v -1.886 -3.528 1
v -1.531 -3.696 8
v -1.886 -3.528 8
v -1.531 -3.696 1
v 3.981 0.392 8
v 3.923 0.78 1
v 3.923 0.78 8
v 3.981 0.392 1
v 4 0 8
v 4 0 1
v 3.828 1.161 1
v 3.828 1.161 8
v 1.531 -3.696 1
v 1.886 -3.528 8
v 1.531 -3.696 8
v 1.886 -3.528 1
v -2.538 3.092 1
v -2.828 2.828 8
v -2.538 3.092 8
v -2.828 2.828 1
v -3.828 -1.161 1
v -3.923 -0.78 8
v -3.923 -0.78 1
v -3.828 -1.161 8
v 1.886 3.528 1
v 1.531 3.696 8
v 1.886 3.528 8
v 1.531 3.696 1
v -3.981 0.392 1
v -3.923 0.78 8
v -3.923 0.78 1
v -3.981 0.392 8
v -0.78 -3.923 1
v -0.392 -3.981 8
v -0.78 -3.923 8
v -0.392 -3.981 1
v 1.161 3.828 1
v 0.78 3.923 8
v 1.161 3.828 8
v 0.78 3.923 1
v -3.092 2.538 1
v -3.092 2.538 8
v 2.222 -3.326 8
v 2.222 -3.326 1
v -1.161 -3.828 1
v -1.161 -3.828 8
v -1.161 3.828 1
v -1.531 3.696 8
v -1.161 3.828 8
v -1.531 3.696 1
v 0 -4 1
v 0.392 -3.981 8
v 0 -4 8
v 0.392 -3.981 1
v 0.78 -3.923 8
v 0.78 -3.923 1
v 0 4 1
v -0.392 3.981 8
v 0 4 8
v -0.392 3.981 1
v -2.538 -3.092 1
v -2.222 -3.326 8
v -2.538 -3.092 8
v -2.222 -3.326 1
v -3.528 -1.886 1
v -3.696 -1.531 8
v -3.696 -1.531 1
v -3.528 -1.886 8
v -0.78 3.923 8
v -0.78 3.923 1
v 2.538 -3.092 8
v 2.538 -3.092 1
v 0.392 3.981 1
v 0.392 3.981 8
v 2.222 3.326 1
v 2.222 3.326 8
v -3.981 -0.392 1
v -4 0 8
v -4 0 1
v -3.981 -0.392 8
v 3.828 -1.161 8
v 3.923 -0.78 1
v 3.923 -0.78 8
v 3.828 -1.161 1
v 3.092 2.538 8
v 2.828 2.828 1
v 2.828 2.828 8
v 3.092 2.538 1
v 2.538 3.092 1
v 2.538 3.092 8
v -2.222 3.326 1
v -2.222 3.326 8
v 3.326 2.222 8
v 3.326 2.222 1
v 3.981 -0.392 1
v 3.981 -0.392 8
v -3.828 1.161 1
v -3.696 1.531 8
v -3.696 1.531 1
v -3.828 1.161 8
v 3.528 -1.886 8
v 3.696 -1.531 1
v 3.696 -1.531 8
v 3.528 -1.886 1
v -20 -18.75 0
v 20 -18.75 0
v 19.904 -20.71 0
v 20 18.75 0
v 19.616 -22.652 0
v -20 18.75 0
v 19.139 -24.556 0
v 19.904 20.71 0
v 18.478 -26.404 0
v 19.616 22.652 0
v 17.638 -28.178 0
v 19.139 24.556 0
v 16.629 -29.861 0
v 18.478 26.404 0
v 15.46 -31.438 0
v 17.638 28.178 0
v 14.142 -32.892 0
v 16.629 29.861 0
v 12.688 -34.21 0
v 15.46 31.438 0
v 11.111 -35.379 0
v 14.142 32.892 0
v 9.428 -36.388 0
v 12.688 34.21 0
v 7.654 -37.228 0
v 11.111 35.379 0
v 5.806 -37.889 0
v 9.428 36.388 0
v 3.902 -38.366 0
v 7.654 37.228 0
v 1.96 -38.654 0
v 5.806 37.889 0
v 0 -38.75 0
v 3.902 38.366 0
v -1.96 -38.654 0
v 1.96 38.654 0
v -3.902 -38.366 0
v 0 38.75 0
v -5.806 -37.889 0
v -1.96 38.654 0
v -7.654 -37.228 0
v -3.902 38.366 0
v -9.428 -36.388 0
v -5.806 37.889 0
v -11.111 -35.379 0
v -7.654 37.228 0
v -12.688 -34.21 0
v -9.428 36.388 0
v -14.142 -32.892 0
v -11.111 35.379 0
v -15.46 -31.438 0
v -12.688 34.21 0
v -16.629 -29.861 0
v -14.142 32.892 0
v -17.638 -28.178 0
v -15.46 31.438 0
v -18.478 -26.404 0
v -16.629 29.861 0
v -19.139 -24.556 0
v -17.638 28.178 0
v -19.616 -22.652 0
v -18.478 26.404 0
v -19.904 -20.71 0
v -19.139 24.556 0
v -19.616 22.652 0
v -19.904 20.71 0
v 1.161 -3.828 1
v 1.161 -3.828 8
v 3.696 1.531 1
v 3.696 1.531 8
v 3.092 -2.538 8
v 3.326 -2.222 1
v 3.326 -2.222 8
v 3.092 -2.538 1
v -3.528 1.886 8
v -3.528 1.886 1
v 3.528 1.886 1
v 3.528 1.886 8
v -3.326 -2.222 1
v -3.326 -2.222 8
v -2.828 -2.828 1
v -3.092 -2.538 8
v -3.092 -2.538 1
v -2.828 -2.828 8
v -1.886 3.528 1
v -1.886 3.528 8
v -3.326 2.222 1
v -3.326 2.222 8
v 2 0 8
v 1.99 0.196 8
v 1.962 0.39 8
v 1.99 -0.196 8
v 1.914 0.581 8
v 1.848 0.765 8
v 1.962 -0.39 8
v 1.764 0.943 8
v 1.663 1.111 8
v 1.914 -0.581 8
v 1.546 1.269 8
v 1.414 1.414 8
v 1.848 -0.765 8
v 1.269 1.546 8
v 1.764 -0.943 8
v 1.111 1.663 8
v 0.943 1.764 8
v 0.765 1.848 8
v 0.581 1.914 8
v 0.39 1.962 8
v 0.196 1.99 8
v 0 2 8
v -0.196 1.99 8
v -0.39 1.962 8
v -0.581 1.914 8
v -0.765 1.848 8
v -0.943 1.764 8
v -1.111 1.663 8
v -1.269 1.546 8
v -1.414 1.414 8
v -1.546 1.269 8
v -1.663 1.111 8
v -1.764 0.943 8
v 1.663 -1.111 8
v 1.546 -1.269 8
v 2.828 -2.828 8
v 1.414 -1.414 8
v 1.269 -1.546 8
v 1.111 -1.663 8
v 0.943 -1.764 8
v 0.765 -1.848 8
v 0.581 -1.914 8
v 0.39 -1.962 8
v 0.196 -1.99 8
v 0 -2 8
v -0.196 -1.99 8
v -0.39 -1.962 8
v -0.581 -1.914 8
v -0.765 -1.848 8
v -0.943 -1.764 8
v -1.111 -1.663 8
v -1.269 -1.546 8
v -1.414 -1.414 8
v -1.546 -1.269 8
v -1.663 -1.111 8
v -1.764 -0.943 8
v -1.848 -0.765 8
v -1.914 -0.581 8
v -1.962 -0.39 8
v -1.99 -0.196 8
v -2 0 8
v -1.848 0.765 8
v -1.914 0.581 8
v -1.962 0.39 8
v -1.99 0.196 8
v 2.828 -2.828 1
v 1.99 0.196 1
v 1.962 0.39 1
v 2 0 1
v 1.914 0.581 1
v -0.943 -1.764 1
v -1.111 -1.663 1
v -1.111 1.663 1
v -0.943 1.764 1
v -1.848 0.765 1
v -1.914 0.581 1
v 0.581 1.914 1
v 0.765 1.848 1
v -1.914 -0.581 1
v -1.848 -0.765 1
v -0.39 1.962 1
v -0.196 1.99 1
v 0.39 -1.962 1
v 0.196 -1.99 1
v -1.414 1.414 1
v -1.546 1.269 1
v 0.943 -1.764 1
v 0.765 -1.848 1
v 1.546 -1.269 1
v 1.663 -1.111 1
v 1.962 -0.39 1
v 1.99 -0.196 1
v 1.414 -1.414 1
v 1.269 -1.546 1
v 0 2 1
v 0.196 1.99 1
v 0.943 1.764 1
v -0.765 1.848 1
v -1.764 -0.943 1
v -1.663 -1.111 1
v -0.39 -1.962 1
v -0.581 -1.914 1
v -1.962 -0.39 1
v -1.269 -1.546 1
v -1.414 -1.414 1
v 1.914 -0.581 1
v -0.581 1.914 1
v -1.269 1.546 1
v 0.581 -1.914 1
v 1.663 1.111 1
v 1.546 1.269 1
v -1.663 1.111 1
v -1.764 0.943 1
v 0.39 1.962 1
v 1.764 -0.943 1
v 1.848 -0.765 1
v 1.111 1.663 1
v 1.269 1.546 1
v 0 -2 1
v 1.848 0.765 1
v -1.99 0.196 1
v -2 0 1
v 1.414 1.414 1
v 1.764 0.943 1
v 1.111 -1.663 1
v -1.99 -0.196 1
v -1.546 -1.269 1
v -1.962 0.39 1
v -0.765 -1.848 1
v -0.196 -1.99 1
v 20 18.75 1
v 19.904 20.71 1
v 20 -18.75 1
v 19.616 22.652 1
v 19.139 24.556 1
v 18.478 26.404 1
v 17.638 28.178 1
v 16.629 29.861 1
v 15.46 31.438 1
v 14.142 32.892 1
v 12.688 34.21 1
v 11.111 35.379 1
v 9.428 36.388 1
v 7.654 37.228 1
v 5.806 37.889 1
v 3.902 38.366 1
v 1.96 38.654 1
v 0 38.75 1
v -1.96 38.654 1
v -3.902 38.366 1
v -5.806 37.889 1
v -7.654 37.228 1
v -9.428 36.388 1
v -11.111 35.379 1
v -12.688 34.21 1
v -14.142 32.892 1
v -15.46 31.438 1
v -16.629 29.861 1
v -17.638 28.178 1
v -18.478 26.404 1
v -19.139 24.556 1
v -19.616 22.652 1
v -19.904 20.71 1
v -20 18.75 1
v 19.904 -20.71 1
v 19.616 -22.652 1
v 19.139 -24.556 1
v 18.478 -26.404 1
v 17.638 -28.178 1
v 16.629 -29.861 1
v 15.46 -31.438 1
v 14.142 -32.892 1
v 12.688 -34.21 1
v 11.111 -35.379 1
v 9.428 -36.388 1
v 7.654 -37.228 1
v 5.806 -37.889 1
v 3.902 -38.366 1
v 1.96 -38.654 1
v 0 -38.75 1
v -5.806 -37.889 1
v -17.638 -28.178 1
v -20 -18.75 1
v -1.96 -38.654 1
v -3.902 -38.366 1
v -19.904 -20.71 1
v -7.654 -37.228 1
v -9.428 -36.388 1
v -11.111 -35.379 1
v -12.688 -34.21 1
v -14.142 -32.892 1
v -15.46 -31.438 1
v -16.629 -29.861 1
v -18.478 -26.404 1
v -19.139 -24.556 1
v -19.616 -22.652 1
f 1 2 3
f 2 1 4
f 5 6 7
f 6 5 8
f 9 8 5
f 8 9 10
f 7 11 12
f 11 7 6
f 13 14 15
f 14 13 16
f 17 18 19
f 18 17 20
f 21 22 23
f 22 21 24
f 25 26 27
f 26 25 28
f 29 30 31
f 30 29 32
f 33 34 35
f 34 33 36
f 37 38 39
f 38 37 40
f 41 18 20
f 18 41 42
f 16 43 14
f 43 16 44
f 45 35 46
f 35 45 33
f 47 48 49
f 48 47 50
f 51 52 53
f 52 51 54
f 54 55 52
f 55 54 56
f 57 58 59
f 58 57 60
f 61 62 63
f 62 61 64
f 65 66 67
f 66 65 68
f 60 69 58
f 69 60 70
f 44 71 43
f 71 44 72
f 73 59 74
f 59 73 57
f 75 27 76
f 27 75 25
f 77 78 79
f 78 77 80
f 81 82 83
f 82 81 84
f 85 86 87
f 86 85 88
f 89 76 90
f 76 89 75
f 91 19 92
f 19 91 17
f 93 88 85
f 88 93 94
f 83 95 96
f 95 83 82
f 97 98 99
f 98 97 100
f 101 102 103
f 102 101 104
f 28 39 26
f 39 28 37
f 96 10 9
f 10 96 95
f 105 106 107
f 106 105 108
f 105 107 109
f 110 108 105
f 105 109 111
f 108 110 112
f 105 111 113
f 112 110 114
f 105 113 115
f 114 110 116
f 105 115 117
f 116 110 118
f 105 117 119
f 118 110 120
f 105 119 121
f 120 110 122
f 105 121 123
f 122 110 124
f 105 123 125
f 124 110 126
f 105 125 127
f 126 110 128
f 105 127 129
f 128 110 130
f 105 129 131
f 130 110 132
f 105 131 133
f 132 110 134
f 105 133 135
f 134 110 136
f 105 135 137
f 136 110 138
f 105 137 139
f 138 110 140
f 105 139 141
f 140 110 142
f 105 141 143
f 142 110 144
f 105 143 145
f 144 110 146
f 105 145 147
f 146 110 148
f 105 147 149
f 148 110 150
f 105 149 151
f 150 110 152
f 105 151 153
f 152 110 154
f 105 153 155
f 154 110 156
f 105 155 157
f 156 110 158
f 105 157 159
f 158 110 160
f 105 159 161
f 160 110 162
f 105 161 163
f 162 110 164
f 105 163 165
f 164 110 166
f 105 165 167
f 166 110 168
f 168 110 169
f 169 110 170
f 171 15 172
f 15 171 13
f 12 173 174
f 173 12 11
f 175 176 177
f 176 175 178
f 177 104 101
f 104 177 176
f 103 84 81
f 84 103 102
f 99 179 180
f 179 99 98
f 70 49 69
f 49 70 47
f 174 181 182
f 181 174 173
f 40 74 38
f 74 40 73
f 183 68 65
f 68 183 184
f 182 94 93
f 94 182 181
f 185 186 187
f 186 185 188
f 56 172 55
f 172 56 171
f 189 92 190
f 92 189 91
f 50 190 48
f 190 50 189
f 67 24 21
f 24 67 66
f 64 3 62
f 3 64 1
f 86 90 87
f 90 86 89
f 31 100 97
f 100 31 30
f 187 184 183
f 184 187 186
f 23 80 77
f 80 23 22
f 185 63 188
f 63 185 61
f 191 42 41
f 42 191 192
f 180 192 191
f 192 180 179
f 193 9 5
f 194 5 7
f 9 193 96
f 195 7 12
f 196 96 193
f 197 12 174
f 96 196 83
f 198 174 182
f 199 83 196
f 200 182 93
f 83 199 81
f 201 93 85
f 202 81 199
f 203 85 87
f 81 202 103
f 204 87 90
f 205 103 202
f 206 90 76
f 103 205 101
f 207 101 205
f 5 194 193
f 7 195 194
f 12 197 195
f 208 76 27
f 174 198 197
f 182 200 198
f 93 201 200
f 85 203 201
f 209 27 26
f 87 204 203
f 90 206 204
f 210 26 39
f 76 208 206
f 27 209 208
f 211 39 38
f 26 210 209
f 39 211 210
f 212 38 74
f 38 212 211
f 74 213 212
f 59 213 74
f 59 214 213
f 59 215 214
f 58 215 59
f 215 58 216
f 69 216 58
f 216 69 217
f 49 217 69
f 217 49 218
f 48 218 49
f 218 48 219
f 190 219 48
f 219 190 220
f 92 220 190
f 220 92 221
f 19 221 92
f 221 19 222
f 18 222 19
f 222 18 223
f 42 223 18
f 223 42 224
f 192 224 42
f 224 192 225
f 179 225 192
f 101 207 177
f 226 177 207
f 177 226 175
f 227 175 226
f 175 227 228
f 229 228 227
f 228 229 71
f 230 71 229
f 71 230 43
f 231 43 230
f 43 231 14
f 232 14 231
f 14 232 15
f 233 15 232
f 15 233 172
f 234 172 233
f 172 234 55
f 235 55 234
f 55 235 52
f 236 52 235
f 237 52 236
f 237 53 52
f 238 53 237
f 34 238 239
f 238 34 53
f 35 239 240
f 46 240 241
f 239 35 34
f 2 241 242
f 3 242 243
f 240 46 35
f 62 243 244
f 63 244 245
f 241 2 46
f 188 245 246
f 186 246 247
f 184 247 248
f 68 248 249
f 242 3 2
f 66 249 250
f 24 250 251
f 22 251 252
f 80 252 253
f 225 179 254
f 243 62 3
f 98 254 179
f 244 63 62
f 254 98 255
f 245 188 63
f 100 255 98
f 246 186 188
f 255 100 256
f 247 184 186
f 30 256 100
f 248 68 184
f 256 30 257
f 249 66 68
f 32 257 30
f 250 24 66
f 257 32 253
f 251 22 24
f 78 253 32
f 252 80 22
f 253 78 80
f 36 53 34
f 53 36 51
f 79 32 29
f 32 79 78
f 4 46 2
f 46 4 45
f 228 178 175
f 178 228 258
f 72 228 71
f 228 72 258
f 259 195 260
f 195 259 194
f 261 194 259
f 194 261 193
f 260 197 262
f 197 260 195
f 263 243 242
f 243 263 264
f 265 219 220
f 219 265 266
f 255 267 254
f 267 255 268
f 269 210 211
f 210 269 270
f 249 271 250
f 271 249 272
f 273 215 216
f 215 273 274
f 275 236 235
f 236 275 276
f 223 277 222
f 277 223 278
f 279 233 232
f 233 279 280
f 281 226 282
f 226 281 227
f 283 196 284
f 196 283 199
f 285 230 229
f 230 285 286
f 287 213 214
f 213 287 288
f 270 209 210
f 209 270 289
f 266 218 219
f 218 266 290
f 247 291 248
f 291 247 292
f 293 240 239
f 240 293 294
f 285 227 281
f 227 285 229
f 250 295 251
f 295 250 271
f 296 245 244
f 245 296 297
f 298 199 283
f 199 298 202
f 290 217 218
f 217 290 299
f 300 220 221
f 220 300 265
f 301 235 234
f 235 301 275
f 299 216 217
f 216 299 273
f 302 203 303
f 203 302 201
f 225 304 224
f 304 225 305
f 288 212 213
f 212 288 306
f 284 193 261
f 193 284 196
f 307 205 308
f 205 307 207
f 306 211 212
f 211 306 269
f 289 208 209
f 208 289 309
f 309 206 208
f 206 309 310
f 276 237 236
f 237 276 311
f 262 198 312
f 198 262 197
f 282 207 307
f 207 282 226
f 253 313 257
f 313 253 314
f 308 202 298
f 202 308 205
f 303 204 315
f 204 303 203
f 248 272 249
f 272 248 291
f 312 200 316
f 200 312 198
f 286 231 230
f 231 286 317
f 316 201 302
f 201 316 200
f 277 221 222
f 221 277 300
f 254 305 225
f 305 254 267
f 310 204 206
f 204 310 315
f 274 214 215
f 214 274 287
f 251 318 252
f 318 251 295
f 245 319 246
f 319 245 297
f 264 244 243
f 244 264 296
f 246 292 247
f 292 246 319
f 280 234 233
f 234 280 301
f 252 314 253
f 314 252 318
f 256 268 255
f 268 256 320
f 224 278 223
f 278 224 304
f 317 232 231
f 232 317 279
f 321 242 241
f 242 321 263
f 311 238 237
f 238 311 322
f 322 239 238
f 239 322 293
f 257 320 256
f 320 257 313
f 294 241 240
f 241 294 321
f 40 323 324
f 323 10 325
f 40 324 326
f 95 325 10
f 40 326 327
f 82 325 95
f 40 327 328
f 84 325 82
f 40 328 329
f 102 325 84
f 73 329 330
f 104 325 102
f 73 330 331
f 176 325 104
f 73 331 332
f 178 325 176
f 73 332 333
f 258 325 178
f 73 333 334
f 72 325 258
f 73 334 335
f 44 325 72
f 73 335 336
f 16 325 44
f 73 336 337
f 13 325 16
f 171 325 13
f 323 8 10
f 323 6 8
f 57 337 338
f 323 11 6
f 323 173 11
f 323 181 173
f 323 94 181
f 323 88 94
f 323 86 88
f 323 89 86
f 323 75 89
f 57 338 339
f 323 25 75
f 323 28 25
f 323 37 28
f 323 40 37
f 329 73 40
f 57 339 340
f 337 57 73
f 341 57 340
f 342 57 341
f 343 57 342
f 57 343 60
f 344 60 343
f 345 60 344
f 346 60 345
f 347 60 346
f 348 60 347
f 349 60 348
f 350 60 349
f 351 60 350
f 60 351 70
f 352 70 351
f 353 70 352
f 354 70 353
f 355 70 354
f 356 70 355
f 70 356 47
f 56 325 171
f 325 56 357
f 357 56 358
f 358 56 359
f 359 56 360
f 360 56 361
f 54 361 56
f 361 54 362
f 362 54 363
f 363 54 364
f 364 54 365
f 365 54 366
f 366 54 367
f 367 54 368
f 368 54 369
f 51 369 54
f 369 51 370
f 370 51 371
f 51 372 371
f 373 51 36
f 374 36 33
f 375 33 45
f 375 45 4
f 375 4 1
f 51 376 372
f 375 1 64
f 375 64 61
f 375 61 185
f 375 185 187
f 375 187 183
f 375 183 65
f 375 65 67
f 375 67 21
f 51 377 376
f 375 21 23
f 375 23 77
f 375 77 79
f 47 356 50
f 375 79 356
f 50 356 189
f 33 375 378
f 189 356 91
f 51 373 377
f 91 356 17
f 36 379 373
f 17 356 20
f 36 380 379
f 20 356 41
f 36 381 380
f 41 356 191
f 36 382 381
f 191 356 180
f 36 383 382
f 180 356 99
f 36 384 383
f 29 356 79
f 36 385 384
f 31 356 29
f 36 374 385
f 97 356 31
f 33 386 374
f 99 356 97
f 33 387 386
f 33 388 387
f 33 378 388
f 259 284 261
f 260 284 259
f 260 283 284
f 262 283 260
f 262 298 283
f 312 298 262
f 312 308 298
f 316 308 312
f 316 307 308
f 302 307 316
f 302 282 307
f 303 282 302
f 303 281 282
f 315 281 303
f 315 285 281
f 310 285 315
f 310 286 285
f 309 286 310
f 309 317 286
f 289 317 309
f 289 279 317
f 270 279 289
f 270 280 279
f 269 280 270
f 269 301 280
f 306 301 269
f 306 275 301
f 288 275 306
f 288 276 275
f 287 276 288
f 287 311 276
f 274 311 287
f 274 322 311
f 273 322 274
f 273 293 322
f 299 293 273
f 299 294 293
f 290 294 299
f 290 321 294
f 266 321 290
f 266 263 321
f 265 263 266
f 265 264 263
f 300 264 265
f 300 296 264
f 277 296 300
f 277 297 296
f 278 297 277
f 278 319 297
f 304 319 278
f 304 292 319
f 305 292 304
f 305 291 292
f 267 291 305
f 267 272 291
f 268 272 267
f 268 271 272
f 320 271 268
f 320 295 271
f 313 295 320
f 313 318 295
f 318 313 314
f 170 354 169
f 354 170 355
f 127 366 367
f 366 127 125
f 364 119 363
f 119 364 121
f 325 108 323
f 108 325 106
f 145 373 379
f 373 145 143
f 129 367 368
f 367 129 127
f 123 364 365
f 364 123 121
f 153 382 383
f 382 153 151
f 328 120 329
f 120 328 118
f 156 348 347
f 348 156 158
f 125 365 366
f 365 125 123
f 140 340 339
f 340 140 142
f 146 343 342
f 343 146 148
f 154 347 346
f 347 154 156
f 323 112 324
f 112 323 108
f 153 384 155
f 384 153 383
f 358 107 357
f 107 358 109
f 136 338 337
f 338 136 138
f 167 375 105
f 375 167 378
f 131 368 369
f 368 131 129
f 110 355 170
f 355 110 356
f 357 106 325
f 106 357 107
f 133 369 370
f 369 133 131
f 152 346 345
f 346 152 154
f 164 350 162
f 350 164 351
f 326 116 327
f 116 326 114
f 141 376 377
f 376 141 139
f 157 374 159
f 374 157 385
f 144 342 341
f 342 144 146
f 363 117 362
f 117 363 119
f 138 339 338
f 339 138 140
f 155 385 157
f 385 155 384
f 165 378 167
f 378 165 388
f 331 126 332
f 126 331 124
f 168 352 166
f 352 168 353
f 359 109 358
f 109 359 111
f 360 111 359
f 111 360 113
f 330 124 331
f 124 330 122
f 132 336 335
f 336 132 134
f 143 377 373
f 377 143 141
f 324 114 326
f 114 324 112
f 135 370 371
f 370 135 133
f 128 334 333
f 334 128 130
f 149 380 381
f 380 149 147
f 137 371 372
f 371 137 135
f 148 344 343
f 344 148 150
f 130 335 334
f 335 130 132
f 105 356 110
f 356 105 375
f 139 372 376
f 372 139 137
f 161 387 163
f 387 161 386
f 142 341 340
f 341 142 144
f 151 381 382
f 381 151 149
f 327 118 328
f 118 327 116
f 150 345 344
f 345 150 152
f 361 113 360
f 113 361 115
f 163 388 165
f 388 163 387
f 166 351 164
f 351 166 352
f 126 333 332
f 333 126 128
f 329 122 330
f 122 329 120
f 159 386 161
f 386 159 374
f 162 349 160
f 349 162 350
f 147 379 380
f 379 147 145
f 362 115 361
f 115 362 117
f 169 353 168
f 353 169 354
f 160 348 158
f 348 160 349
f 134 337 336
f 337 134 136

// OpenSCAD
// file: ../modules/lib.scad
// ===== shared helpers (no top-level geometry) =====

// 2D rounded rectangle centered at origin
module rounded_rect(w, h, r) {
    hull() for (sx = [-1, 1], sy = [-1, 1])
        translate([sx*(w/2 - r), sy*(h/2 - r)]) circle(r);
}

// hollow shell body: outer rounded box with a 45 deg CHAMFERED TOP edge, open at the
// +z (base) face, leaving a `wall`-thick top face at z in [0, wall].
//
// Chamfer rather than fillet: the shell prints top-face-down, so the top edge is on
// the build plate and a tangent fillet would start horizontal there — a local 90 deg
// overhang. A 45 deg chamfer is support-free and reads the same from a metre away.
module shell_body(depth) {
    difference() {
        hull() {
            linear_extrude(0.01)
                rounded_rect(2*flat_half(), 2*flat_half(), max(0.5, radius - chamfer));
            translate([0, 0, chamfer])
                linear_extrude(depth - chamfer)
                    rounded_rect(outer_w(), outer_h(), radius);
        }
        translate([0, 0, wall])
            linear_extrude(depth)
                rounded_rect(outer_w() - 2*wall, outer_h() - 2*wall, max(0.5, radius - wall));
    }
}

// screw boss with a self-tap pilot (or a heat-set insert bore), base at z=0
module screw_boss(h, od, pilot) {
    difference() {
        cylinder(h = h, d = od);
        translate([0, 0, -0.1]) cylinder(h = h + 0.2, d = pilot);
    }
}

// boolean helper: do two centered AABBs (at p1/p2, sizes s1/s2) clear each other?
function aabb_clear(p1, s1, p2, s2) =
    (abs(p1[0]-p2[0]) >= (s1[0]+s2[0])/2) || (abs(p1[1]-p2[1]) >= (s1[1]+s2[1])/2);
// main file
include <../modules/params.scad>
include <../modules/lib.scad>

// ===== shell / envelope =====
// `plan` is not a free choice: it is bounded below by the two measured boards. This is
// the assert that replaces guessing at a footprint — it names the number needed rather
// than letting a too-small case fail as a pile of unrelated collisions further down.
assert(plan >= plan_min(),
       str("plan too small for the boards — needs at least ", plan_min(),
           " (width ", plan_from_width(), ", boss/s3 ", plan_from_boss_s3(),
           ", boss/dac ", plan_from_boss_dac(), ", depth ", plan_from_depth(), ")"));
assert(s3_pos_x == 0,
       "the devkit must be centred in x: with four corner bosses, a board this deep has no y escape");
assert(outer_w() == plan && outer_h() == plan, "the puck is square");
// cavity_depth has the same derived floor as `plan`, for the same reason: it is set by
// the devkit's component stack (s3_comp_h) against whatever hangs off the top face. The
// old guard here was a hard-coded `outer_d() == 29`, which stopped meaning anything as
// soon as s3_comp_h became a measured number.
assert(cavity_depth >= cavity_min(),
       str("cavity_depth too shallow for the devkit — needs at least ", cavity_min(),
           " (bare ", cavity_from_bare(), ", mic ", cavity_from_mic(),
           ", button holder ", cavity_from_button(), "), giving outer height ",
           cavity_min() + 2*wall));
assert(outer_d() == top_depth() + wall, "base must be a FLAT plate: outer depth = top_depth + wall");
assert(chamfer < radius, "top chamfer must be smaller than the corner radius");
assert(chamfer > 0 && chamfer < top_depth(), "top chamfer out of range");
assert(flat_half() > 0, "top chamfer swallowed the whole top face");
assert(reg_h > 0 && reg_h < cavity_depth, "registration lip out of range");
assert(reg_t > 0 && reg_t < wall, "registration lip must be thinner than the wall");

// ===== corner bosses =====
// They are FULL-DEPTH free-standing pillars, so they are obstacles on every plane in
// the box — that is what forces the two big boards to stack instead of sit side by
// side. Every plan-mounted feature below is checked against them.
assert(boss_od >= insert_m3_d + 3, "corner boss too thin around the heat-set insert");
assert(insert_m3_d > screw_clear, "heat-set bore must be wider than the screw clearance");
assert(screw_cbore_d > screw_clear, "counterbore must be wider than the screw clearance");
assert(screw_cbore_h < wall, "counterbore must not cut through the base plate");
assert(boss_c() + boss_od/2 <= inner_half(), "corner bosses run into the side walls");

boss_cs = [for (sx = [-1,1], sy = [-1,1]) [sx*boss_c(), sy*boss_c()]];
module clears_bosses(c, sz, name) {
    for (cb = boss_cs)
        assert(aabb_clear(c, sz, cb, [boss_od, boss_od]), str(name, " clashes a corner boss"));
}
module inside_cavity(c, sz, name) {
    assert(abs(c[0]) + sz[0]/2 <= inner_half(), str(name, " off the cavity width"));
    assert(abs(c[1]) + sz[1]/2 <= inner_half(), str(name, " off the cavity depth"));
}

// ===== plan layout =====
// Both board pockets live on the BASE PLATE and must not overlap each other; the mic
// seat and the button module hang off the TOP FACE and must not overlap each other. The
// two groups are on opposite parts, so they are checked against each other in z.
// (The button module's own checks live in its section further down.)
inside_cavity(s3_pocket_c(), s3_pocket_f(), "S3 pocket");
inside_cavity(dac_pocket_c(), dac_pocket_f(), "DAC pocket");
inside_cavity(mic_pos,       mic_size(),     "mic seat+posts");
clears_bosses(s3_pocket_c(), s3_pocket_f(), "S3 pocket");
clears_bosses(dac_pocket_c(), dac_pocket_f(), "DAC pocket");
clears_bosses(mic_pos,       mic_size(),     "mic seat+posts");

assert(aabb_clear(dac_pocket_c(), dac_pocket_f(), s3_pocket_c(), s3_pocket_f()),
       "the two board pockets overlap on the base plate — move s3_pos_x or shrink the DAC");

// Top-face features must stay on the FLAT face — the chamfer, not the outer edge, is
// the real bound.
assert(abs(btn_pos[0]) + btn_halo_od/2 <= flat_half(), "button halo runs onto the chamfer (x)");
assert(abs(btn_pos[1]) + btn_halo_od/2 <= flat_half(), "button halo runs onto the chamfer (y)");
assert(abs(mic_pos[0]) + mic_size()[0]/2 <= flat_half(), "mic seat runs onto the chamfer (x)");
assert(abs(mic_pos[1]) + mic_size()[1]/2 <= flat_half(), "mic seat runs onto the chamfer (y)");
// ===== plate boards vs top-face features: the vertical checks =====
// The mic and the button module hang down from the top face; the two boards stand up off
// the plate. Where a pair overlaps in PLAN the vertical gap is what keeps the case
// closable, and it is invisible until it isn't. Where they don't overlap the gap is
// irrelevant, so each check is conditional — an unconditional one fires on layouts
// that are perfectly fine, which is exactly what happened when the DAC grew a 6.5 mm
// socket and started standing taller than the devkit.
if (!aabb_clear(dac_pocket_c(), dac_pocket_f(), mic_pos, mic_size()))
    assert(dac_top_z() > wall + mic_post_h + mic_clamp_t + 2, "DAC socket collides with the mic clamp");
assert(dac_top_z() > wall + 2, "DAC socket reaches the top face — deepen cavity_depth");
assert(s3_top_z() > wall + mic_post_h + pcb_t + 2,
       "mic board reaches into the devkit — deepen cavity_depth");
assert(s3_pcb_top_z() > 0 && s3_top_z() > wall, "devkit stack does not fit the cavity at all");

// ===== rear wall: devkit USB-C window + 3.5 mm jack =====
// The window must be a BOUNDED hole: material left above AND below, so the rim that
// meets the base plate stays continuous and the plate still has something to seat on.
assert(s3_usb_cz() - s3_usb_h/2 >= wall, "USB window runs into the top face — lower the devkit");
assert(s3_usb_cz() + s3_usb_h/2 <= top_depth() - 1.5,
       "USB window breaks the base rim — raise s3_seat_h or shrink s3_usb_h");
// The window must expose BOTH receptacles, not straddle the gap between them. This is
// the check that was missing when a 14 mm window left neither port usable: it has to be
// at least as wide as the two ports plus the gap, and it has to stay on the board.
assert(s3_usb_w() >= s3_usb_ports*s3_usb_port_w + (s3_usb_ports-1)*s3_usb_gap,
       "USB window narrower than the ports it serves — no plug would fit either one");
assert(s3_usb_w() <= s3_l + 2*board_clr,
       "USB window wider than the devkit — it would open past the board");
// ...and the pocket must have NO rear wall, or its stubs sit in front of the ports. So
// the pocket has to STOP AT OR IN FRONT OF the board's own rear edge: any pocket material
// behind that edge is, by definition, between the receptacles and the window. Here the
// pocket ends ~1 mm in front of it, so the board's last millimetre overhangs the floor —
// harmless on a 69 mm board, and it guarantees nothing at all sits under the ports.
assert(s3_pocket_y0() >= s3_cy() - s3_w/2 - 0.001,
       "devkit pocket reaches behind the board's rear edge — that material would block the USB ports");
assert(s3_pocket_y1() > s3_cy() + s3_w/2, "devkit pocket has no +y wall to locate the board");
// Reach check. A USB-C plug has only ~6.5 mm of shell before its overmold, and with the
// rear open the board registers against the shell wall, so the setback is just the wall
// plus the sliding clearance.
assert(usb_setback() <= 6.5,
       "USB receptacle sits too deep for a plug to reach — the board is not registering on the rear wall");

// ===== +x side wall: the DAC's own 3.5 mm socket =====
// The cutout is placed from the BOARD, not set by hand, so it cannot drift away from
// the socket it serves. What can still go wrong is the socket landing off the wall,
// in a corner boss, or past the base rim.
assert(dac_jack_w > 0 && dac_jack_h > 0, "DAC socket body geometry");
assert(abs(dac_jack_end) == 1, "dac_jack_end picks an end: -1 or +1");
assert(dac_jack_inset >= 0 && dac_jack_inset + dac_jack_w <= dac_l,
       "DAC socket does not fit along the board edge — check dac_jack_w/dac_jack_inset vs dac_l");
assert(abs(dac_jack_off()) + dac_jack_w/2 <= dac_l/2,
       "DAC socket falls off the board edge");
// The socket sits in the board's CORNER, so its offset from the board centre is large.
// Guard that it really is out at the end — if this collapses toward zero, the offset has
// stopped being derived from the board and is being typed in again.
assert(abs(dac_jack_off()) >= dac_l/2 - dac_jack_w - 1,
       "DAC socket offset is not at the board end any more — is dac_jack_off() still derived?");
// ...and the whole point of that offset going into the BOARD's position: the hole itself
// must land exactly where jack_hole_y says, which is the middle of the wall. This is the
// assert that would have caught the hole sitting 10 mm away from its socket.
assert(abs(dac_jack_y() - jack_hole_y) < 0.001,
       "socket does not line up with the hole — dac_pos_y() must absorb dac_jack_off()");
// the socket must clear the pocket's own end wall, which is just outboard of the board
assert(abs(dac_jack_off()) + dac_jack_w/2 <= dac_l/2 + board_clr,
       "socket body runs into the DAC pocket's end wall");
assert(dac_jack_axis > 0 && dac_jack_axis < dac_jack_h,
       "the barrel axis must lie inside the socket body");

// -- pull-out stop: the rib that keeps plug-removal load off the thinned panel --
// It only exists if the socket overhangs the PCB by more than the wall's unthinned
// remainder. Below that there is no gap between the board's edge and the wall to put a
// rib in, and the socket goes back to being the backstop.
assert(jack_stop_proj() > 0.4,
       str("no room for a DAC pull-out stop — needs dac_jack_overhang > ",
           wall - jack_panel_t - dac_socket_setback + 0.4,
           "; below that the socket lands on the thinned panel instead"));
assert(jack_stop_proj() < wall - 0.8, "pull-out stop projects further than the wall can carry");
// z: between the socket above and the register lip below, and it must actually overlap the
// PCB's thickness or it catches nothing.
assert(jack_stop_z1() > jack_stop_z0() + 0.8, "pull-out stop has no bearing height");
assert(jack_stop_z0() >= dac_pcb_top_z(), "pull-out stop rises into the socket body");
assert(jack_stop_z0() < dac_pcb_top_z() + pcb_t,
       "pull-out stop sits below the PCB edge — it would catch nothing");
assert(jack_stop_z1() <= top_depth() - reg_h, "pull-out stop collides with the register lip");
// y: entirely clear of the socket, or the base plate cannot rise into the shell
assert(jack_stop_y1() > jack_stop_y0() + 5, "pull-out stop too short to bear on");
assert(jack_stop_y0() >= dac_jack_y() + dac_jack_w/2,
       "pull-out stop crosses the socket's path — the case could not be assembled");
assert(jack_stop_y1() <= dac_pos_y() + dac_l/2, "pull-out stop overhangs the board's end");
for (cb = boss_cs)
    assert(abs(jack_stop_y1() - cb[1]) >= 4 || abs(inner_half() - cb[0]) >= boss_od,
           "pull-out stop runs into a corner boss");
// The local thinning is the whole reason a plug seats. Guard both ends of it: a panel
// thicker than ~1.5 mm eats the plug's insertion depth, and one thinner than 2 layers
// will not survive a plug being levered sideways.
assert(jack_panel_t >= 0.8 && jack_panel_t <= 1.5,
       "jack_panel_t out of range — thicker and a plug will not seat, thinner and the panel tears");
assert(jack_panel_t < wall, "the socket panel must actually be THINNER than the wall");
assert(jack_hole_d > 4.5, "plug hole must clear a 3.5 mm plug and its tolerance");
assert(jack_hole_d + 2*jack_lead_in <= dac_jack_w + 2*clr,
       "plug hole + chamfer is wider than the counterbore behind it — the panel would vanish");
assert(jack_lead_in > 0 && jack_lead_in < jack_panel_t, "socket lead-in chamfer out of range");
// The socket must stay BEHIND the outer skin, or the plate cannot rise into the shell.
assert(dac_socket_setback > 0, "socket face must sit behind the thinned panel, not in it");
assert(dac_pcb_edge_x() + dac_jack_overhang <= outer_w()/2 - jack_panel_t,
       "socket protrudes through the outer skin — the base plate could not be assembled");
// counterbore bounded top and bottom within the wall's height
assert(dac_top_z() - clr >= wall + 1, "socket counterbore runs into the top face");
assert(dac_pcb_top_z() + clr <= top_depth() - 1.5,
       "socket counterbore breaks the base rim — raise dac_seat_h or deepen cavity_depth");
// side-wall features live in (y, z) and the bosses span every z, so the socket must
// clear them in y alone
for (cb = boss_cs)
    assert(abs(dac_jack_y() - cb[1]) >= (dac_jack_w + 2*clr + boss_od)/2,
           "DAC socket cutout runs into a corner boss");
assert(abs(dac_jack_y()) + dac_jack_w/2 + clr + jack_lead_in <= inner_half(),
       "DAC socket cutout runs off the side wall");

// ===== button module: shell bore, cap, holder =====
// The three parts share one z chain and one diameter chain, so these asserts are what
// keep them mating after any single edit. This is the fussiest fit on the case, which
// is exactly why the mechanism is a separate part.

// -- shell side: a bore, a recess, a halo, two blind pilots --
assert(btn_cap_d > btn_bore_d, "cap face must be wider than the bore or it falls in");
assert(btn_recess_d >= btn_cap_d + 2*clr, "cap recess must clear the cap face");
assert(btn_recess_depth < wall, "cap recess must not cut through the top face");
assert(btn_halo_id >= btn_recess_d, "halo groove overlaps the cap recess");
assert(btn_halo_od > btn_halo_id && btn_halo_depth < btn_recess_depth, "halo groove geometry");
assert(btn_pilot_depth < wall - 0.6, "holder pilots must stay blind — they would show through the top face");
assert(btn_pilot_depth > 1.5, "holder pilots too shallow for an M2 to hold");
// pilots must clear the halo groove, or a pilot opens into it
assert(btn_pilot_pitch/2 - board_screw_pilot/2 > btn_halo_od/2,
       "holder pilots run into the halo groove — widen btn_pilot_pitch");

// -- cap: snaps through the shell bore, catches inside the holder --
assert(btn_skirt_t > 0 && btn_slits >= 3, "the skirt must be a slit annulus, or it cannot snap in");
assert(btn_slit_w < btn_skirt_od()*PI/(2*btn_slits), "slits eat more than half the skirt");
assert(btn_skirt_id() > btn_post_d, "cap skirt bore is narrower than its own centre post");
assert(btn_post_d < sw_plunger_d, "cap post is wider than the plunger it presses");
assert(btn_post_d < bh_apert_d(), "cap post cannot enter the holder's plunger aperture");
assert(btn_skirt_h() > 0, "cap skirt has no length — check btn_recess_depth against the wall");
assert(btn_post_h() > btn_skirt_h() + btn_lip_t, "cap post is shorter than its own skirt");
assert(btn_proud() > 0, "cap face sits below the top surface — nothing to press");
// The cap must have travel LEFT when the switch actuates, or the face bottoms on the
// recess floor and the switch never closes.
assert(btn_face_gap > sw_travel, "cap bottoms on the recess floor before the switch actuates");

// -- the catch: lip vs the holder's bore, and vs the shell bore it passes on the way in
assert(btn_lip_od() > bh_bore_d(), "retention lip does not catch on the holder");
assert((btn_lip_od() - bh_bore_d())/2 >= 0.3,
       "lip catches on less than 0.3 mm of shoulder — raise btn_lip_over");
assert(btn_lip_od() > btn_bore_d,
       "lip passes the shell bore freely — the cap would only be held by the holder");
assert(bh_relief_d() > btn_lip_od(), "no radial room for the lip in the holder's relief");
assert(bh_relief_h >= btn_lip_t + 0.2, "lip relief is shorter than the lip");

// -- holder: switch capture and printability --
assert(bh_apert_d() < sw_body, "plunger aperture is wider than the switch body — it would fall through");
assert(bh_apert_d() > sw_plunger_d, "plunger aperture is narrower than the plunger");
assert(bh_gap_h > sw_plunger_h + sw_travel,
       "aperture too short for the plunger plus its travel");
assert(bh_z1() > bh_apert_z1(), "no switch pocket");
assert(bh_block >= sw_body + 2*clr + 2*bh_wall, "switch pocket walls thinner than bh_wall");
// the block has to be wide enough to LAND on the plate: the lip relief is cut through
// the plate's lower face, so a block narrower than that relief would float unsupported
assert(bh_block >= bh_relief_d() + 2*bh_wall,
       "holder block is narrower than the lip relief — it would print unsupported");
assert(bh_plate_w >= bh_relief_d() + 2*2, "holder plate too narrow around the lip relief");
assert(bh_plate_l >= btn_pilot_pitch + 2*(bh_screw_clear + 1.5),
       "holder plate too short to carry both screws");
assert(bh_plate_w >= bh_block && bh_plate_l >= bh_block, "holder plate narrower than its own block");
assert(bh_screw_clear > board_screw_pilot, "holder holes must clear the M2 they pass");
assert(sw_leg_slot_w < sw_body + 2*clr + 2*bh_wall, "leg slots wider than the block");
assert(bh_plate_r > 0 && bh_plate_r < min(bh_plate_w, bh_plate_l)/2, "holder plate corner radius");

// -- the assembled module must fit the box and clear what is under it --
assert(bh_z1() < top_depth() - 2, "button module reaches the base plate");
if (!aabb_clear(btn_pos, [bh_plate_w, bh_plate_l], s3_pocket_c(), s3_pocket_f()))
    assert(s3_top_z() > bh_z1() + 2, "button module collides with the devkit");
if (!aabb_clear(btn_pos, [bh_plate_w, bh_plate_l], dac_pocket_c(), dac_pocket_f()))
    assert(dac_top_z() > bh_z1() + 2, "button module collides with the DAC");
clears_bosses(btn_pos, [bh_plate_w, bh_plate_l], "button holder plate");
assert(aabb_clear(btn_pos, [bh_plate_w, bh_plate_l], mic_pos, mic_size()),
       "button holder plate overlaps the mic seat");

// ===== microphone =====
assert(mic_seat_depth + mic_gasket_depth < wall, "mic seat + gasket seat cut through the top face");
assert(mic_gasket_d > mic_hole_d, "mic gasket seat must be wider than the port");
assert(mic_gasket_d <= mic_board_l, "mic gasket seat wider than the board it seals against");
assert(mic_post_pitch/2 - mic_post_od/2 >= (mic_board_w + 2*clr)/2,
       "mic posts intrude into the board recess");
// The clamp bar spans both posts and its pad reaches back down to the seated board.
assert(mic_clamp_pad_h() > 0,
       "mic clamp pad has no height — the posts are shorter than the seated board");
assert(mic_clamp_pad < mic_board_w && mic_clamp_pad <= mic_board_l,
       "mic clamp pad overhangs the board it presses");
assert(mic_screw_clear > board_screw_pilot, "clamp holes must clear the M2 they pass");
assert(mic_clamp_len() >= mic_post_pitch + mic_post_od, "clamp bar does not span both posts");
assert(mic_clamp_w <= mic_post_od + 4, "clamp bar wider than the posts can support");
// Thin on purpose (half its first value). It only has to hold gasket compression and
// the pad does the pressing, but below ~1 mm the bar bows instead of clamping and the
// gasket seal goes with it.
assert(mic_clamp_t >= 1.0, "clamp bar too thin to press without bowing");
// the clamp lives inside the box, so it has to clear what is around the mic
assert(wall + mic_post_h + mic_clamp_t < s3_top_z(), "mic clamp collides with the devkit");

// ===== base plate: pockets, vents, feet, screws =====
// Both pockets must nest inside the registration lip, not foul it. The DAC pocket is
// deliberately allowed to run right up to the lip's inner edge (they merge into one
// solid, which prints fine) but may not cross it, or the plate will not drop in.
assert(abs(s3_pos_x) + s3_pocket_f()[0]/2 <= lip_inner_half(), "devkit pocket fouls the register lip (x)");
assert(max(abs(s3_pocket_y0()), abs(s3_pocket_y1())) <= lip_inner_half(), "devkit pocket fouls the register lip (y)");
assert(dac_pocket_x1() <= lip_inner_half(), "DAC pocket crosses the register lip");
assert(abs(dac_pos_y()) + dac_pocket_f()[1]/2 <= lip_inner_half(), "DAC pocket fouls the register lip (y)");
assert(dac_pocket_x0() < dac_pocket_x1(), "DAC pocket has no length — the board is too long for the plate");
// the pockets must clear the plate's own screw counterbores
for (cb = boss_cs) {
    assert(aabb_clear(s3_pocket_c(), s3_pocket_f(), cb, [screw_cbore_d, screw_cbore_d]),
           "devkit pocket clashes a base-plate screw");
    assert(aabb_clear(dac_pocket_c(), dac_pocket_f(), cb, [screw_cbore_d, screw_cbore_d]),
           "DAC pocket clashes a base-plate screw");
}
assert(s3_seat_h > 0 && s3_lip > 0, "devkit pocket needs a floor and a retaining lip");
assert(dac_seat_h > 0 && dac_lip > 0, "DAC pocket needs a floor and a retaining lip");
// ---- how TALL the pocket walls may be ----
// The lip is the wall standing above the seated PCB. Only the part of it level with the
// PCB's own 1.6 mm edge can transfer lateral load; everything above that is shrouding,
// not strength. So a lip is bounded by what it might hit rather than by any mechanical
// need, and these are the two things it can reach: the mic assembly hanging off the top
// face (which overlaps the devkit pocket's +y wall in plan), and the DAC's own socket.
function s3_wall_top_z()  = plate_inner_z() - (s3_seat_h + pcb_t + s3_lip);
function dac_wall_top_z() = plate_inner_z() - (dac_seat_h + pcb_t + dac_lip);
assert(s3_wall_top_z() > wall + mic_post_h + mic_clamp_t + 2,
       "devkit pocket wall is tall enough to hit the mic clamp — reduce s3_lip");
assert(s3_wall_top_z() > bh_z1() + 2 || abs(s3_pos_x) + s3_pocket_f()[0]/2 - pocket_wall > bh_plate_w/2,
       "devkit pocket wall is tall enough to hit the button holder — reduce s3_lip");
assert(dac_wall_top_z() > wall + 2, "DAC pocket wall reaches the top face — reduce dac_lip");
// The DAC lip covers the socket rather than stopping partway up it. It is NOT what resists
// a levered plug: the walls sit ~4 mm clear of the socket in y, so that job belongs to the
// counterbore in the shell wall, which wraps the socket body with 0.4 mm all round.
assert(dac_lip >= dac_jack_h,
       str("dac_lip does not cover the 3.5 mm socket — needs at least ", dac_jack_h));
assert(dac_lip <= dac_jack_h + 2, "dac_lip now stands proud of the socket — it adds nothing");

// ---- pin relief: the reason the floors are not flat ----
// Without it the board rests on its solder-side pin tails, sits ~2 mm proud, and the lip
// ends up level with the gap UNDER the board instead of its edge — which is what made
// the first walls appear to "cover the pins".
assert(board_pin_h > 0, "no pin relief: the board would seat on its own pin tails");
// The strips must stop SHORT of the cavity face, or they undercut the pocket wall's base and
// its exposed height grows by the relief depth — which is what made the DAC's front wall
// look paper-thin. Still has to reach under the header row, ~2.5 mm in from the board edge.
assert(pin_relief_setback > 0, "pin relief undercuts the pocket wall base");
assert(pin_relief_setback + 1 < board_clr + 2.5,
       "pin relief setback pushes the channel out from under the header row");
assert(board_pin_h + clr <= s3_seat_h - 0.8,
       str("pin relief would leave too little devkit pocket floor — raise s3_seat_h to at least ",
           board_pin_h + clr + 0.8));
assert(board_pin_h + clr <= dac_seat_h - 0.8,
       str("pin relief would leave too little DAC pocket floor — raise dac_seat_h to at least ",
           board_pin_h + clr + 0.8));
// Devkit: strips on the LONG (+-x) edges, so they must leave a central land in x and an
// end land in y.
assert(2*pin_row_w < s3_l + 2*board_clr - 4, "pin relief strips swallow the devkit's central land");
assert(pin_land > 1 && 2*pin_land < s3_w, "devkit pin relief leaves no end land");
// DAC: strips on the SHORT (+-y) edges instead, because its long +x edge carries the
// socket and needs floor under it. So the lands swap axes.
assert(2*pin_row_w < dac_l + 2*board_clr - 4, "pin relief strips swallow the DAC's central land");
assert(pin_land > 1 && 2*pin_land < dac_w, "DAC pin relief leaves no end land");
// ...and the point of the swap: the socket's long edge keeps its floor. With short-edge
// strips the +x edge is untouched over its whole length.
assert(dac_w + 2*board_clr - 2*pin_land > 0, "DAC relief strips have no width left");
// The strips run off the RIGHT (+x) end of the floor — the pocket's open side — and are
// landed at the left. Check both ends: the right must actually reach the floor's edge (a
// channel stopping short is a dead end, and that is invisible in a render), and it must not
// run past it into the register lip.
function dac_relief_xhi() = dac_pocket_x1();
function dac_relief_xlo() = dac_cx() - (dac_w/2 + board_clr - pin_land);
assert(dac_relief_xhi() >= dac_pocket_x1() - 0.001,
       "DAC relief stops short of the floor's open edge — it would be a dead end");
assert(dac_relief_xhi() <= lip_inner_half() + 0.001,
       "DAC relief runs past the floor into the register lip");
assert(dac_relief_xlo() > dac_pocket_x0() + pocket_wall,
       "DAC relief no longer has a land at its left end — it would breach the left wall");

// vents: clear of both pockets, the feet and the screws. A vent opening under a pocket
// floor vents nothing and just weakens the plate.
for (v = vent_rects) {
    vc = [v[0], v[1]];  vs = [v[2], v[3]];
    assert(aabb_clear(vc, vs, s3_pocket_c(), s3_pocket_f()),
           str("vent at ", vc, " opens under the devkit pocket"));
    assert(aabb_clear(vc, vs, dac_pocket_c(), dac_pocket_f()),
           str("vent at ", vc, " opens under the DAC pocket"));
    for (cb = boss_cs)
        assert(aabb_clear(vc, vs, cb, [screw_cbore_d, screw_cbore_d]),
               str("vent at ", vc, " runs into a screw counterbore"));
    for (f = foot_positions)
        assert(aabb_clear(vc, vs, f, [foot_d, foot_d]),
               str("vent at ", vc, " breaks into a foot recess"));
    assert(abs(v[0]) + v[2]/2 <= lip_inner_half() && abs(v[1]) + v[3]/2 <= lip_inner_half(),
           str("vent at ", vc, " runs into the register lip"));
}
// foot_positions is empty by default — see params. These checks exist for anyone who
// re-populates it. A foot recess is on the OUTER face and a pocket floor on the INNER
// one, and in a 3 mm plate the two together do not fit, so a foot may not sit under a
// pocket at all: that is the check the old "sum of depths" version was too loose to
// catch, and it let a foot land 0.1 mm inside the DAC pocket floor.
for (f = foot_positions) {
    assert(abs(f[0]) + foot_d/2 <= plan/2 - 2 && abs(f[1]) + foot_d/2 <= plan/2 - 2,
           "foot recess runs off the plate edge");
    assert(foot_depth < wall - 1, "foot recess leaves too little plate under it");
    for (cb = boss_cs)
        assert(norm([f[0]-cb[0], f[1]-cb[1]]) >= (foot_d + screw_cbore_d)/2,
               "foot recess overlaps a screw counterbore");
    assert(foot_depth + s3_seat_h < wall || aabb_clear([f[0],f[1]], [foot_d,foot_d], s3_pocket_c(), s3_pocket_f()),
           "foot recess would break through the devkit pocket floor");
    assert(foot_depth + dac_seat_h < wall || aabb_clear([f[0],f[1]], [foot_d,foot_d], dac_pocket_c(), dac_pocket_f()),
           "foot recess would break through the DAC pocket floor");
}

// helper render smoke — these must produce geometry without warnings
linear_extrude(1) rounded_rect(20, 10, 2);
linear_extrude(1) rounded_rect(vent_rects[0][2], vent_rects[0][3], vent_rects[0][2]/2);
screw_boss(8, boss_od, insert_m3_d);

cube(1);  // non-empty render under --hardwarnings
